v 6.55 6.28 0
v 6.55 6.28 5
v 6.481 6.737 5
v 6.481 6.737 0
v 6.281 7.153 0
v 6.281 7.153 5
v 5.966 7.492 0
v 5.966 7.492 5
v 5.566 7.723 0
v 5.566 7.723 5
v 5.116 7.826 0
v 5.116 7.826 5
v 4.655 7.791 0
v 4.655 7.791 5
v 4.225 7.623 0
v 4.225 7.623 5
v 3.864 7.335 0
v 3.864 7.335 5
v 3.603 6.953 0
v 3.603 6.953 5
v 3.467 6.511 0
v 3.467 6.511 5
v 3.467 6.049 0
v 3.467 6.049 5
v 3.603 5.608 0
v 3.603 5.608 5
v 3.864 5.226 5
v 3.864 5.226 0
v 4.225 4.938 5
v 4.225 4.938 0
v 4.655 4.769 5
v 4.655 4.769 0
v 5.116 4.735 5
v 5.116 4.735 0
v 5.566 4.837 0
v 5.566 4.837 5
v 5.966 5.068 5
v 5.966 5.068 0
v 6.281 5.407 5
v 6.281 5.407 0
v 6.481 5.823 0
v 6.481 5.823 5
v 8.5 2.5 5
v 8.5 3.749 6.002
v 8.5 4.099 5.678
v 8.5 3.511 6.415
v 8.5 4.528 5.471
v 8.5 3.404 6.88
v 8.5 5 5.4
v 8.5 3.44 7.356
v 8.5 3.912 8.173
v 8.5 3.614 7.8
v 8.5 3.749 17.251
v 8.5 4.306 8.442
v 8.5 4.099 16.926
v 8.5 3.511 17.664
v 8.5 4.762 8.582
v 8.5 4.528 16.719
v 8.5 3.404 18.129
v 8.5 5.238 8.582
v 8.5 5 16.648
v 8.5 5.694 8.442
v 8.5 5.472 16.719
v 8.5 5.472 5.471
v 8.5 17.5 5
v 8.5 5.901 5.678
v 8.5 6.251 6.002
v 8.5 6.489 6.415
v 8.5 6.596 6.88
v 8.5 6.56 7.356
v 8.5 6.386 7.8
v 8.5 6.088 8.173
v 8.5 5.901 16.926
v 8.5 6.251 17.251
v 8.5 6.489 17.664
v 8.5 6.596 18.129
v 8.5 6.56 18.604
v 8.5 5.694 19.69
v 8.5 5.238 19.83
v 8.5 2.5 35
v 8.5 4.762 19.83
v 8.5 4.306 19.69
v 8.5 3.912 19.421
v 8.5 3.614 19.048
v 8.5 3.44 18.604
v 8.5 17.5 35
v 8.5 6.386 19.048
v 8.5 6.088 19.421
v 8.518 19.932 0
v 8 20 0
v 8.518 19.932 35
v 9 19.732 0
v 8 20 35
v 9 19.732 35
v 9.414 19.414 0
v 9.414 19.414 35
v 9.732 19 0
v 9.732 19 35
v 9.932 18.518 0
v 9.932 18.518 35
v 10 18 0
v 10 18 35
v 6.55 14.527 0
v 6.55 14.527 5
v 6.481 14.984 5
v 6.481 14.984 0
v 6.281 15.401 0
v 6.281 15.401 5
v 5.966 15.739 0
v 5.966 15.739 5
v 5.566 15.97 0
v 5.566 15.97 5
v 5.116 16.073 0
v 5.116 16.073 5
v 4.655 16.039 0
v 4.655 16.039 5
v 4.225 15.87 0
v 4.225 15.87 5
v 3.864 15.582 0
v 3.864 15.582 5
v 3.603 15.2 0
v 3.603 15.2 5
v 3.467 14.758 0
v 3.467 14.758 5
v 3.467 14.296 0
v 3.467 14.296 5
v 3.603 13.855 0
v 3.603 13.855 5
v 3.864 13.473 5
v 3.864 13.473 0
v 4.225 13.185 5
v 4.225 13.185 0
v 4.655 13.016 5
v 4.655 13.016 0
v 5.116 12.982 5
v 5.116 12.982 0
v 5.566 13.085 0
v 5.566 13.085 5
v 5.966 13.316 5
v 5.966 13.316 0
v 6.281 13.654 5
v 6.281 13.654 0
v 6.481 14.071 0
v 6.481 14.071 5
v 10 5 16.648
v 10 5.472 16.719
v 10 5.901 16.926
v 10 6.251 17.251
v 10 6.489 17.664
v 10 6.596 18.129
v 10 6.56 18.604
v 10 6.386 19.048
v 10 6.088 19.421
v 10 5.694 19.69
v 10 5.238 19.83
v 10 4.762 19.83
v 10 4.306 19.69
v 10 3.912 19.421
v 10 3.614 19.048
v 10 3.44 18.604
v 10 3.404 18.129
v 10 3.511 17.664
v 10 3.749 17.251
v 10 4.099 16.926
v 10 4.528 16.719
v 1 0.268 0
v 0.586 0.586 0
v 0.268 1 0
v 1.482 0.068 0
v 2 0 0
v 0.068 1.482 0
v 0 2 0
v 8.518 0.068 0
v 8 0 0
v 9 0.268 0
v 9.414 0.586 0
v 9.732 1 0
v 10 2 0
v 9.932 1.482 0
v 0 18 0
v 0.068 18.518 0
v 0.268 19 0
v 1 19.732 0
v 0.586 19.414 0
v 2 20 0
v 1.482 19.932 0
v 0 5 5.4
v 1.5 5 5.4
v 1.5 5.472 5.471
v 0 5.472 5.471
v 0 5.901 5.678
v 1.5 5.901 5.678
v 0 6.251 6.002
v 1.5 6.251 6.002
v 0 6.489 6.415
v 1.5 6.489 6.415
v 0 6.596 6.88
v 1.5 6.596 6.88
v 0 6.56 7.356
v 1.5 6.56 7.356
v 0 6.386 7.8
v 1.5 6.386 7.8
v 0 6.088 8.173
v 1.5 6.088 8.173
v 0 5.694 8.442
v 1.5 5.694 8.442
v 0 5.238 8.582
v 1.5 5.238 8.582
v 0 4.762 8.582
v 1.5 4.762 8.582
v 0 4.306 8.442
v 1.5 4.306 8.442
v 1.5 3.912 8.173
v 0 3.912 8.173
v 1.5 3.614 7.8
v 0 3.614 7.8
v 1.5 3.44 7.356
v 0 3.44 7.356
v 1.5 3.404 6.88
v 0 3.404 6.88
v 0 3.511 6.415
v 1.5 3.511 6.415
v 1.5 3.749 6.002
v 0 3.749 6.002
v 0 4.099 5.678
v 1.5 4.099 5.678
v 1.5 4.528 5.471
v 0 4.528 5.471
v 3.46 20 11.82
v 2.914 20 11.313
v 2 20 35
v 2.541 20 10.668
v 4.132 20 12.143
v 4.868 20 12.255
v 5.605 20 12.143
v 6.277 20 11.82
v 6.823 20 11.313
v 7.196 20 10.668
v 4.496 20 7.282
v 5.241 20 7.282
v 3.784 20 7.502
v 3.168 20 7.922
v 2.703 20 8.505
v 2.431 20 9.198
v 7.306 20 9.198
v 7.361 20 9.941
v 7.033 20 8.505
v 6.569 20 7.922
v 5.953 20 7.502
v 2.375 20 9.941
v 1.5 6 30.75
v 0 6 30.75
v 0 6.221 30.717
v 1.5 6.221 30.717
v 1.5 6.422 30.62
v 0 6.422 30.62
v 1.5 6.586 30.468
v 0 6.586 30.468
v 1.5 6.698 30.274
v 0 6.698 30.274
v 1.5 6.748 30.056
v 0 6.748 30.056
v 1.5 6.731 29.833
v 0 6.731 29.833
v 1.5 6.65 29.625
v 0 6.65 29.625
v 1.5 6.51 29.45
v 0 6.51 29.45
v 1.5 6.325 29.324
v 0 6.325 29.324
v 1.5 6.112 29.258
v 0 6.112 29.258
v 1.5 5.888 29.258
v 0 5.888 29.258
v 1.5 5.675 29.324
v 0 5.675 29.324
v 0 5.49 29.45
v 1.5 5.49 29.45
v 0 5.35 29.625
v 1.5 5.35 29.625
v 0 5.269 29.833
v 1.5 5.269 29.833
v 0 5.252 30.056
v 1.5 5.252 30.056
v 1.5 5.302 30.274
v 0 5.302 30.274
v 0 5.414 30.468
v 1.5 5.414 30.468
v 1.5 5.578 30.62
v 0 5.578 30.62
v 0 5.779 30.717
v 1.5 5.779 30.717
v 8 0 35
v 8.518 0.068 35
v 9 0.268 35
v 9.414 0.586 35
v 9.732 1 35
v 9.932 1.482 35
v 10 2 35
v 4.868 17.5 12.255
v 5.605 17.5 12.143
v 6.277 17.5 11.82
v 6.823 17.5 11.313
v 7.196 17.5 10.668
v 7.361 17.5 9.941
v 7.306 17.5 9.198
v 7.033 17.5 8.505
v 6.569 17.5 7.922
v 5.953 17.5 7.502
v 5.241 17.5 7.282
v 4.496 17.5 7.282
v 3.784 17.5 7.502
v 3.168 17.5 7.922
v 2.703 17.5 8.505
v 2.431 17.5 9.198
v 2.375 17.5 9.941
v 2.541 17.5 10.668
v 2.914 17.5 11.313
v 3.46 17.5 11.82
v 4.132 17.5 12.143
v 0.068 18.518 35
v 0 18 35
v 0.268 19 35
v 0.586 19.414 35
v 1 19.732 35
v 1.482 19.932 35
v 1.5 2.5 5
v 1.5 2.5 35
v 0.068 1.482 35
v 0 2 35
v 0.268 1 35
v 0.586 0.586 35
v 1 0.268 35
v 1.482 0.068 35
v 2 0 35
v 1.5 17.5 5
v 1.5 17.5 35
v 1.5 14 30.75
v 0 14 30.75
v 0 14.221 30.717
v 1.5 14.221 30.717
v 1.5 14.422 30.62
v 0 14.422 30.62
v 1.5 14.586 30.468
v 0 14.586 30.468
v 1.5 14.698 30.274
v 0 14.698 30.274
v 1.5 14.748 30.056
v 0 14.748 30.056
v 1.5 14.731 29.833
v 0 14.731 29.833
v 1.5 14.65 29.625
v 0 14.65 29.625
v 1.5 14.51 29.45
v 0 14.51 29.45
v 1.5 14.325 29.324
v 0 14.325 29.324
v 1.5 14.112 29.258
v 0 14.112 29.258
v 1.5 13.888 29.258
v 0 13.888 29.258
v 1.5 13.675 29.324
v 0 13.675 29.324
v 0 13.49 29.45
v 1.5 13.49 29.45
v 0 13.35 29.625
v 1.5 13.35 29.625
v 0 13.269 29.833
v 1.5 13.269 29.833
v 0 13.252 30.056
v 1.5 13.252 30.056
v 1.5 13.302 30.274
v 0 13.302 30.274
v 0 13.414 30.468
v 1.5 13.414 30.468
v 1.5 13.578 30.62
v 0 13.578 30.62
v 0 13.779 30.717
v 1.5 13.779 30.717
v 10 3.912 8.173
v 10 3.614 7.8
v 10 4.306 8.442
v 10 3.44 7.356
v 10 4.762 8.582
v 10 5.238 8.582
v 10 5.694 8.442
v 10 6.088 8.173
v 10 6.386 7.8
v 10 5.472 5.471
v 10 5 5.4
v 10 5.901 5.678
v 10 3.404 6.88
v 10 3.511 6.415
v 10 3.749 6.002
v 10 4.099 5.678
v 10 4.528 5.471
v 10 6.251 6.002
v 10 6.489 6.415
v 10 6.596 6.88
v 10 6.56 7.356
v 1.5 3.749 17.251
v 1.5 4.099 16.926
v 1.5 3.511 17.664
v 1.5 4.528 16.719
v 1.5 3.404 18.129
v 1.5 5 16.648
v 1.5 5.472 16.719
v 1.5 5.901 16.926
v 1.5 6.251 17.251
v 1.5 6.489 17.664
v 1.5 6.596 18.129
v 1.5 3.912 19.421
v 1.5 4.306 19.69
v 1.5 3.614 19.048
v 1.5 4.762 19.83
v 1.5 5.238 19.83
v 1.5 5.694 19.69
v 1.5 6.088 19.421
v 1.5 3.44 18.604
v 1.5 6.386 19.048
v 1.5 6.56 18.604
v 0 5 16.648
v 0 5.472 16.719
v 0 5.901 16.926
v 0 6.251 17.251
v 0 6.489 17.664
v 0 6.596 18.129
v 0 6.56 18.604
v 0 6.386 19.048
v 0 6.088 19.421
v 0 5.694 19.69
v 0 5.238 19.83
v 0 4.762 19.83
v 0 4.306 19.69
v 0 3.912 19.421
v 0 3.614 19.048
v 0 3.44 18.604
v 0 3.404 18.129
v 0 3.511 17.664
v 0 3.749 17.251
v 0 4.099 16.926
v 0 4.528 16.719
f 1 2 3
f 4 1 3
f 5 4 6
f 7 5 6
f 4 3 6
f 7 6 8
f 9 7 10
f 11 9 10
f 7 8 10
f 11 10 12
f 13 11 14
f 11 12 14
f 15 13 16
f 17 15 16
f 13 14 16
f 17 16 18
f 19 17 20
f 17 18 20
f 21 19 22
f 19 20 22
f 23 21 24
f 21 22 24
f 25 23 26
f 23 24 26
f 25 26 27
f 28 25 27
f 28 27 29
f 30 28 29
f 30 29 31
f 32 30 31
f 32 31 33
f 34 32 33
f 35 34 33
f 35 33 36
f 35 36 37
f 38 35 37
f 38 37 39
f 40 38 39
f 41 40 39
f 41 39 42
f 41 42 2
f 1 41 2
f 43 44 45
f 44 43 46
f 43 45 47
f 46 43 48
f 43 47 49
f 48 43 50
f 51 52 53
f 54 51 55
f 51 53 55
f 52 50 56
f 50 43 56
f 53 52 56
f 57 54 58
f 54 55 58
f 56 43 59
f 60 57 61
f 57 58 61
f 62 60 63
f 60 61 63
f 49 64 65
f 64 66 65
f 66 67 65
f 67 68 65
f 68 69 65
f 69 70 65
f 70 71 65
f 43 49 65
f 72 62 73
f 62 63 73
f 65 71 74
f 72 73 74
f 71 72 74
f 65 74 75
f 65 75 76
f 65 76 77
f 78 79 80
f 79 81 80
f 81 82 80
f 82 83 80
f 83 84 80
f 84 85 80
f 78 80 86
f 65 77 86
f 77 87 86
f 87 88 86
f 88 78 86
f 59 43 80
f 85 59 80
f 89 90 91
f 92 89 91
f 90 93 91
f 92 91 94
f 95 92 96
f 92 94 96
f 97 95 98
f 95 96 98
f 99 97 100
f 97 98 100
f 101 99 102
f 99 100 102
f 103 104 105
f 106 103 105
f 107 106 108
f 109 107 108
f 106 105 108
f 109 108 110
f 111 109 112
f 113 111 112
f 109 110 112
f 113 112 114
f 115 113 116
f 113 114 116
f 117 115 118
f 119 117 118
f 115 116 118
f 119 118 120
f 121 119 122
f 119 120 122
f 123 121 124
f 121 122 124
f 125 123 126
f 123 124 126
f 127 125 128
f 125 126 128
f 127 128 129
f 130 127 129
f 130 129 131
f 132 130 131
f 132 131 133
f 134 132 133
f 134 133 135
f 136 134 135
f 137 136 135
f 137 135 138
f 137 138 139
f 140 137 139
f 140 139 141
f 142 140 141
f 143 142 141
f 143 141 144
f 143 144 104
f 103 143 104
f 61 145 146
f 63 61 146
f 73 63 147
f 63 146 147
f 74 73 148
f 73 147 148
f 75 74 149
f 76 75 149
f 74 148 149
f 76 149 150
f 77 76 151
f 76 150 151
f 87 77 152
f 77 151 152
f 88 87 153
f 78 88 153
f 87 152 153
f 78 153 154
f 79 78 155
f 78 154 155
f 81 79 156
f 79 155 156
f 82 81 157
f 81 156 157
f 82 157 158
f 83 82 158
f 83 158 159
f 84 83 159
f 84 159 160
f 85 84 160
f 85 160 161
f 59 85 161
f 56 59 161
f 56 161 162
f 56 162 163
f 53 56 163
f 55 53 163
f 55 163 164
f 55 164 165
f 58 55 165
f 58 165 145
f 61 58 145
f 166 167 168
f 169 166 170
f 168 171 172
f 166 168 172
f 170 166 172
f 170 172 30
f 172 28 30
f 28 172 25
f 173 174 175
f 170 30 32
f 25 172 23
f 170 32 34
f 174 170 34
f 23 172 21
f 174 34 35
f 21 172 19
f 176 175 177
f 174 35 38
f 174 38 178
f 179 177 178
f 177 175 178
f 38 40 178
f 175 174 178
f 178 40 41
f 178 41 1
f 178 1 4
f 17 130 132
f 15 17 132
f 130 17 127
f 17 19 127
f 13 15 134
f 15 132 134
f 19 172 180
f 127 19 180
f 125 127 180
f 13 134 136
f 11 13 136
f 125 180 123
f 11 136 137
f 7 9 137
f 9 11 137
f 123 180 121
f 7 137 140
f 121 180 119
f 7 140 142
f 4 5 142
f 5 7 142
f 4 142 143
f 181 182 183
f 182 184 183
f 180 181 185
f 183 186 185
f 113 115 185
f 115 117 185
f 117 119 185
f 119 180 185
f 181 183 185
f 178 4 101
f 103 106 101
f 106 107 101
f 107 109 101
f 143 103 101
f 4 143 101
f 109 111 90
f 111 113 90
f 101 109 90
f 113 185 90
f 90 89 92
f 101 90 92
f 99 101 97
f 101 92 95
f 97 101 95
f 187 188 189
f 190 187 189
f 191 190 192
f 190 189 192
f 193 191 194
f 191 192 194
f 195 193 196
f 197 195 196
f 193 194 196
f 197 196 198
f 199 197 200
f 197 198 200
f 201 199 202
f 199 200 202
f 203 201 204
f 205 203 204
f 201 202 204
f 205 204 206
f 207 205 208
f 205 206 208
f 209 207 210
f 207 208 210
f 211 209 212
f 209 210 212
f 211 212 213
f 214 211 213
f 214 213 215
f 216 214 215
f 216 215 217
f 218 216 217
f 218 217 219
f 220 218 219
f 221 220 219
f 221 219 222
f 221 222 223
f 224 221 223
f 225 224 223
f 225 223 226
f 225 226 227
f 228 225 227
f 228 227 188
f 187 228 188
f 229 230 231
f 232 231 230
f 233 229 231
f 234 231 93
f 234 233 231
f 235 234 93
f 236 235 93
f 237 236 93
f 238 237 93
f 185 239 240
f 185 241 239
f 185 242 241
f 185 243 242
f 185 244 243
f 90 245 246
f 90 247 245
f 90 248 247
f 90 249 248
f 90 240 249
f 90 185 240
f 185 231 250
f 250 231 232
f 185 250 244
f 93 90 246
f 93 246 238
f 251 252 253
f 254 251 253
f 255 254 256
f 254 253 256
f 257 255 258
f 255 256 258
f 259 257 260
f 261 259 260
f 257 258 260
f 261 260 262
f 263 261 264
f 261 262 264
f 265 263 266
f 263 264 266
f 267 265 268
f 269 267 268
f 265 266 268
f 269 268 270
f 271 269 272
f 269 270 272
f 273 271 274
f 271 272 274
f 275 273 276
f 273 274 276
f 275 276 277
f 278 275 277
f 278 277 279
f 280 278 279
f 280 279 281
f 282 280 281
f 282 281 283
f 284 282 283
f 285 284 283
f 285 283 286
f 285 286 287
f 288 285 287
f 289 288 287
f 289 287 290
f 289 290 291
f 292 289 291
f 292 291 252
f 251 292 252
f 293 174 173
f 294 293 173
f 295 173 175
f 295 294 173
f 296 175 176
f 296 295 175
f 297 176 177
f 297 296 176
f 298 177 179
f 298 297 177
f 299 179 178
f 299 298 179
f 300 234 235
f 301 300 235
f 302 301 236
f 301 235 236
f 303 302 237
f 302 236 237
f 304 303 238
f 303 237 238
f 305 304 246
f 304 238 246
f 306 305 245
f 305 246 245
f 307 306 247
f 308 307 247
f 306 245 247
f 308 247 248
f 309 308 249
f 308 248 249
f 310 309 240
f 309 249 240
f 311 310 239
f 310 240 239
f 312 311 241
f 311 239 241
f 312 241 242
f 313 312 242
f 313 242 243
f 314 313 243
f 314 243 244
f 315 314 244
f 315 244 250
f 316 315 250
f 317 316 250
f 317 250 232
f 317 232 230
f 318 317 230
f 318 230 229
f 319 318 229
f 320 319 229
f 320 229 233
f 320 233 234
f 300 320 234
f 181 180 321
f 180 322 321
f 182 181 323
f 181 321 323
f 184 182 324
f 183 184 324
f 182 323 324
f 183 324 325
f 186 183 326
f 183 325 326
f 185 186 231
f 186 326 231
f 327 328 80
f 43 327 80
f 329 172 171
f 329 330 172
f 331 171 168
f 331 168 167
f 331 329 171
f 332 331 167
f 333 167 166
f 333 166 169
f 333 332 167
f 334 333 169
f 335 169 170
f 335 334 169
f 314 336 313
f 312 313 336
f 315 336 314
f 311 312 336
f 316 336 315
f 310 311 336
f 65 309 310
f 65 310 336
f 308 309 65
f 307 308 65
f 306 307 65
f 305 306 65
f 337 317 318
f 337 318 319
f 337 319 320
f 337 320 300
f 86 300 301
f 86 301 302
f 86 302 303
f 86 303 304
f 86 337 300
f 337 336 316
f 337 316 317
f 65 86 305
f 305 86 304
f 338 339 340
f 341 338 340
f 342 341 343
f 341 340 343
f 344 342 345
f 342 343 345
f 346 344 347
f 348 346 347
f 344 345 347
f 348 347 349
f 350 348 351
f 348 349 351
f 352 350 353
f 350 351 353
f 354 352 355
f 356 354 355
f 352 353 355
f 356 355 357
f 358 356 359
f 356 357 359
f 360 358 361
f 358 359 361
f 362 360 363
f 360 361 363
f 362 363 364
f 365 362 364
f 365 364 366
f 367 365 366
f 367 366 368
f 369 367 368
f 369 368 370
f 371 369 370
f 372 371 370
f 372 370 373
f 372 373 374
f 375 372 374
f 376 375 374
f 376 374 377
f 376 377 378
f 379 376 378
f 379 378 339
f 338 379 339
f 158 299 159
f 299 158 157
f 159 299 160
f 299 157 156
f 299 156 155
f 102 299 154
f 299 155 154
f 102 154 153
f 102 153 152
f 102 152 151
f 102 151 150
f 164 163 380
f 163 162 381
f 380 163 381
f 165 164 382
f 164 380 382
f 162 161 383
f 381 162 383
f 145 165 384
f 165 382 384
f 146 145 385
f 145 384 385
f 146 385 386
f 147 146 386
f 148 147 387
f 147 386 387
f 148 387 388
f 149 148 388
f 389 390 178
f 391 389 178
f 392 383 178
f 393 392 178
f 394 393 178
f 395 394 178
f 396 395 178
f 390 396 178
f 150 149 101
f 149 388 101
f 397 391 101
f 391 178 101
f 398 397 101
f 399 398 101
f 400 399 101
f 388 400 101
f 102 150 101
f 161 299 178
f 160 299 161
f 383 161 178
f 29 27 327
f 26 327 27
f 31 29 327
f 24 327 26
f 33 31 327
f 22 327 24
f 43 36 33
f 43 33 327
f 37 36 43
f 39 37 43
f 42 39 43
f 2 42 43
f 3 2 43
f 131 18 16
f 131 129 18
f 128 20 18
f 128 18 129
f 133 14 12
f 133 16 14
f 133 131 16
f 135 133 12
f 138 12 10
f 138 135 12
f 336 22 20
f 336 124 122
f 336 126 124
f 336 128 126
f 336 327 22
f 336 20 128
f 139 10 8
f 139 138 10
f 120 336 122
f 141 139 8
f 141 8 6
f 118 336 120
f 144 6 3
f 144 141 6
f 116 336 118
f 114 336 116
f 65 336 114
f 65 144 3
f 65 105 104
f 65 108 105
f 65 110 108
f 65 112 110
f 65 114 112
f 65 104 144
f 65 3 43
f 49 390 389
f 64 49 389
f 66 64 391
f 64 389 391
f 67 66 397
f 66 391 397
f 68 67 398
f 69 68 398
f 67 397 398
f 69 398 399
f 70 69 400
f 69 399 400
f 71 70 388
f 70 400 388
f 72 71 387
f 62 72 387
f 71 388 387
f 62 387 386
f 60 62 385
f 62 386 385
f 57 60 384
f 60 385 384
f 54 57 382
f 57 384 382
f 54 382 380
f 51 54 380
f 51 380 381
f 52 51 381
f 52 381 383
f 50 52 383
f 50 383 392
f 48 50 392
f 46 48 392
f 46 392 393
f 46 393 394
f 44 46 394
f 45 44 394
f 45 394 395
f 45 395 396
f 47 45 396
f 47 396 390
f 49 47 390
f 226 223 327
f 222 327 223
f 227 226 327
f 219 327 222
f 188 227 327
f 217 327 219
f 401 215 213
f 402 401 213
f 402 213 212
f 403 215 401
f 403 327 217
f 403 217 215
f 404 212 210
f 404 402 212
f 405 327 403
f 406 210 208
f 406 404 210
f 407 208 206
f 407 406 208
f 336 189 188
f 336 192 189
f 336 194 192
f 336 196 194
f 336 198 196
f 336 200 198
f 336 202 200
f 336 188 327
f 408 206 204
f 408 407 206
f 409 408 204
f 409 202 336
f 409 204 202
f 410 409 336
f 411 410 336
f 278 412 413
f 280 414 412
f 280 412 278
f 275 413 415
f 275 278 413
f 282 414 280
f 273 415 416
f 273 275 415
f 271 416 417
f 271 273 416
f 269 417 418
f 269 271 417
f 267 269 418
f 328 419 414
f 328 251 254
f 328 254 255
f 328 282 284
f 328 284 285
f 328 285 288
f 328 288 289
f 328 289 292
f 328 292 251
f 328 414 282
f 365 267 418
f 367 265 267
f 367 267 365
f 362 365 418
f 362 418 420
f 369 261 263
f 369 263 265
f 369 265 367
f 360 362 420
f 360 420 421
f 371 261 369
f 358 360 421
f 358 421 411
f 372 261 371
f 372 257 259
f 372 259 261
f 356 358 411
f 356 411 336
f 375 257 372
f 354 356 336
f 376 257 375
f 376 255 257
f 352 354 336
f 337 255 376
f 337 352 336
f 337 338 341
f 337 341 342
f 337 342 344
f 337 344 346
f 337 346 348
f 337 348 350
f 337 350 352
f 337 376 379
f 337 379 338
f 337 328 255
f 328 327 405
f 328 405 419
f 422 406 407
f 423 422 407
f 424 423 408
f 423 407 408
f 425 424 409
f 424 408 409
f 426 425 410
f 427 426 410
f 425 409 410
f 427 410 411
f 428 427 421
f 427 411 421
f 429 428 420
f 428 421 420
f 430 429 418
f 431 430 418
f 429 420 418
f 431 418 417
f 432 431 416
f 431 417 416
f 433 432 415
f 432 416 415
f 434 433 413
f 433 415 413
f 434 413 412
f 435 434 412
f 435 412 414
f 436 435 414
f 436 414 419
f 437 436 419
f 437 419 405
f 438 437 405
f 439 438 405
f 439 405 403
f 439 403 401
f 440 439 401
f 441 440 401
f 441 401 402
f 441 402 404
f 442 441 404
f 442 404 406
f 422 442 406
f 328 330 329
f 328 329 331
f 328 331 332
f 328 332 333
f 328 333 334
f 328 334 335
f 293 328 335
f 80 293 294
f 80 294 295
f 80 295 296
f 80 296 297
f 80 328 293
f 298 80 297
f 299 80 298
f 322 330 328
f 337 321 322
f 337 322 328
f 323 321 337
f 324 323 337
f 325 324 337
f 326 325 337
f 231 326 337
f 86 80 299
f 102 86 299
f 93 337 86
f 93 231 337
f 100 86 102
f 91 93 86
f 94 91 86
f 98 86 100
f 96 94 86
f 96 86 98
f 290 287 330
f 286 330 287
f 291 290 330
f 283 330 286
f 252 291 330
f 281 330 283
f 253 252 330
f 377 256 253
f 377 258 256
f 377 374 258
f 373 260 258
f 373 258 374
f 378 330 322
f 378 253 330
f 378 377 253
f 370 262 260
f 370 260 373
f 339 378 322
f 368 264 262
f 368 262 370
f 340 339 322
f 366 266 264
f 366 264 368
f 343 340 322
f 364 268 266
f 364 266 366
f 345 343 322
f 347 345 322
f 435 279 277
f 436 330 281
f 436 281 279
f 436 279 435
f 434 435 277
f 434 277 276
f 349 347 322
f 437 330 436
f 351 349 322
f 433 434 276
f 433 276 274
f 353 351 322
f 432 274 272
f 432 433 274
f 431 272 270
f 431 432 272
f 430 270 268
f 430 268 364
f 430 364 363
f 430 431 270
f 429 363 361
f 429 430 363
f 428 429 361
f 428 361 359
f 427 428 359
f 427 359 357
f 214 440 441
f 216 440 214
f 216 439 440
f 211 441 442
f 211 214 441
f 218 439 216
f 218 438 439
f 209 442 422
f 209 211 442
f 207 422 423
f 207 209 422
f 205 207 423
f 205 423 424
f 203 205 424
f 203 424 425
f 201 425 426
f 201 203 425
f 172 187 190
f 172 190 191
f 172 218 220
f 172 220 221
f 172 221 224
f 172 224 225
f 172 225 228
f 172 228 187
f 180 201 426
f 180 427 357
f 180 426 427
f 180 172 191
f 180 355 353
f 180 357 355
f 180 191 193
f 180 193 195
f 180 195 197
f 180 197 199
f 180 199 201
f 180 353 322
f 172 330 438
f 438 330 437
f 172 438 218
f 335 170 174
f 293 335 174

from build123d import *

# Parameters (mm, degrees)
ESQUISSE1_W             = 10
ESQUISSE1_H             = 20
BOSS_EXTRU_1_DEPTH      = 35
ESQUISSE2_W             = 7
ESQUISSE2_H             = 15
ENL_V_MAT_EXTRU_1_DEPTH = 30
ESQUISSE3_R             = 1.55
ENL_V_MAT_EXTRU_2_DEPTH = 38.416573868
ESQUISSE4_R             = 2.5
ENL_V_MAT_EXTRU_3_DEPTH = 5
ESQUISSE5_R             = 0.75
ENL_V_MAT_EXTRU_4_DEPTH = 2.5
CONG_1_R                = 2
ESQUISSE6_R             = 1.6
ENL_V_MAT_EXTRU_5_DEPTH = 42.533119315


with BuildPart() as part:
    # Esquisse1 → Boss.-Extru.1 (new body)
    with BuildSketch(Plane.XY):
        with Locations((5, 10)):
            Rectangle(ESQUISSE1_W, ESQUISSE1_H)
    extrude(amount=BOSS_EXTRU_1_DEPTH)

    # Esquisse2 → Enlèv. mat.-Extru.1 (cut)
    with BuildSketch(Plane.XY.offset(35)):
        with Locations((5, 10)):
            Rectangle(ESQUISSE2_W, ESQUISSE2_H)
    extrude(amount=-ENL_V_MAT_EXTRU_1_DEPTH, mode=Mode.SUBTRACT)

    # Esquisse3 → Enlèv. mat.-Extru.2 (cut, through all)
    with BuildSketch(Plane.XY.offset(5)):
        with Locations((5, 14.527380154)):
            Circle(ESQUISSE3_R)
        with Locations((5, 6.280248244)):
            Circle(ESQUISSE3_R)
    extrude(amount=-ENL_V_MAT_EXTRU_2_DEPTH, mode=Mode.SUBTRACT)

    # Esquisse4 → Enlèv. mat.-Extru.3 (cut)
    with BuildSketch(Plane(origin=(0, 20, 0), x_dir=(1, 0, 0), z_dir=(0, 1, 0))):
        with Locations(Location((4.86841115, -9.754551776, 0), (0, 0, 270))):
            Circle(ESQUISSE4_R)
    extrude(amount=-ENL_V_MAT_EXTRU_3_DEPTH, mode=Mode.SUBTRACT)

    # Esquisse5 → Enlèv. mat.-Extru.4 (cut)
    with BuildSketch(Plane.ZY):
        with Locations((30, 14)):
            Circle(ESQUISSE5_R)
        with Locations((30, 6)):
            Circle(ESQUISSE5_R)
    extrude(amount=-ENL_V_MAT_EXTRU_4_DEPTH, mode=Mode.SUBTRACT)

    # Congé1
    cong_1_edges = [part.edges().sort_by_distance(p)[0] for p in [
        (0, 20, 17.5),
        (10, 20, 17.5),
        (10, 0, 17.5),
        (0, 0, 17.5),
    ]]
    fillet(cong_1_edges, radius=CONG_1_R)

    # Esquisse6 → Enlèv. mat.-Extru.5 (cut, through all)
    with BuildSketch(Plane(origin=(10, 0, 0), x_dir=(0, 0, -1), z_dir=(1, 0, 0))):
        with Locations((-7, 5)):
            Circle(ESQUISSE6_R)
        with Locations((-18.24812381, 5)):
            Circle(ESQUISSE6_R)
    extrude(amount=-ENL_V_MAT_EXTRU_5_DEPTH, mode=Mode.SUBTRACT)


solid = part.part
